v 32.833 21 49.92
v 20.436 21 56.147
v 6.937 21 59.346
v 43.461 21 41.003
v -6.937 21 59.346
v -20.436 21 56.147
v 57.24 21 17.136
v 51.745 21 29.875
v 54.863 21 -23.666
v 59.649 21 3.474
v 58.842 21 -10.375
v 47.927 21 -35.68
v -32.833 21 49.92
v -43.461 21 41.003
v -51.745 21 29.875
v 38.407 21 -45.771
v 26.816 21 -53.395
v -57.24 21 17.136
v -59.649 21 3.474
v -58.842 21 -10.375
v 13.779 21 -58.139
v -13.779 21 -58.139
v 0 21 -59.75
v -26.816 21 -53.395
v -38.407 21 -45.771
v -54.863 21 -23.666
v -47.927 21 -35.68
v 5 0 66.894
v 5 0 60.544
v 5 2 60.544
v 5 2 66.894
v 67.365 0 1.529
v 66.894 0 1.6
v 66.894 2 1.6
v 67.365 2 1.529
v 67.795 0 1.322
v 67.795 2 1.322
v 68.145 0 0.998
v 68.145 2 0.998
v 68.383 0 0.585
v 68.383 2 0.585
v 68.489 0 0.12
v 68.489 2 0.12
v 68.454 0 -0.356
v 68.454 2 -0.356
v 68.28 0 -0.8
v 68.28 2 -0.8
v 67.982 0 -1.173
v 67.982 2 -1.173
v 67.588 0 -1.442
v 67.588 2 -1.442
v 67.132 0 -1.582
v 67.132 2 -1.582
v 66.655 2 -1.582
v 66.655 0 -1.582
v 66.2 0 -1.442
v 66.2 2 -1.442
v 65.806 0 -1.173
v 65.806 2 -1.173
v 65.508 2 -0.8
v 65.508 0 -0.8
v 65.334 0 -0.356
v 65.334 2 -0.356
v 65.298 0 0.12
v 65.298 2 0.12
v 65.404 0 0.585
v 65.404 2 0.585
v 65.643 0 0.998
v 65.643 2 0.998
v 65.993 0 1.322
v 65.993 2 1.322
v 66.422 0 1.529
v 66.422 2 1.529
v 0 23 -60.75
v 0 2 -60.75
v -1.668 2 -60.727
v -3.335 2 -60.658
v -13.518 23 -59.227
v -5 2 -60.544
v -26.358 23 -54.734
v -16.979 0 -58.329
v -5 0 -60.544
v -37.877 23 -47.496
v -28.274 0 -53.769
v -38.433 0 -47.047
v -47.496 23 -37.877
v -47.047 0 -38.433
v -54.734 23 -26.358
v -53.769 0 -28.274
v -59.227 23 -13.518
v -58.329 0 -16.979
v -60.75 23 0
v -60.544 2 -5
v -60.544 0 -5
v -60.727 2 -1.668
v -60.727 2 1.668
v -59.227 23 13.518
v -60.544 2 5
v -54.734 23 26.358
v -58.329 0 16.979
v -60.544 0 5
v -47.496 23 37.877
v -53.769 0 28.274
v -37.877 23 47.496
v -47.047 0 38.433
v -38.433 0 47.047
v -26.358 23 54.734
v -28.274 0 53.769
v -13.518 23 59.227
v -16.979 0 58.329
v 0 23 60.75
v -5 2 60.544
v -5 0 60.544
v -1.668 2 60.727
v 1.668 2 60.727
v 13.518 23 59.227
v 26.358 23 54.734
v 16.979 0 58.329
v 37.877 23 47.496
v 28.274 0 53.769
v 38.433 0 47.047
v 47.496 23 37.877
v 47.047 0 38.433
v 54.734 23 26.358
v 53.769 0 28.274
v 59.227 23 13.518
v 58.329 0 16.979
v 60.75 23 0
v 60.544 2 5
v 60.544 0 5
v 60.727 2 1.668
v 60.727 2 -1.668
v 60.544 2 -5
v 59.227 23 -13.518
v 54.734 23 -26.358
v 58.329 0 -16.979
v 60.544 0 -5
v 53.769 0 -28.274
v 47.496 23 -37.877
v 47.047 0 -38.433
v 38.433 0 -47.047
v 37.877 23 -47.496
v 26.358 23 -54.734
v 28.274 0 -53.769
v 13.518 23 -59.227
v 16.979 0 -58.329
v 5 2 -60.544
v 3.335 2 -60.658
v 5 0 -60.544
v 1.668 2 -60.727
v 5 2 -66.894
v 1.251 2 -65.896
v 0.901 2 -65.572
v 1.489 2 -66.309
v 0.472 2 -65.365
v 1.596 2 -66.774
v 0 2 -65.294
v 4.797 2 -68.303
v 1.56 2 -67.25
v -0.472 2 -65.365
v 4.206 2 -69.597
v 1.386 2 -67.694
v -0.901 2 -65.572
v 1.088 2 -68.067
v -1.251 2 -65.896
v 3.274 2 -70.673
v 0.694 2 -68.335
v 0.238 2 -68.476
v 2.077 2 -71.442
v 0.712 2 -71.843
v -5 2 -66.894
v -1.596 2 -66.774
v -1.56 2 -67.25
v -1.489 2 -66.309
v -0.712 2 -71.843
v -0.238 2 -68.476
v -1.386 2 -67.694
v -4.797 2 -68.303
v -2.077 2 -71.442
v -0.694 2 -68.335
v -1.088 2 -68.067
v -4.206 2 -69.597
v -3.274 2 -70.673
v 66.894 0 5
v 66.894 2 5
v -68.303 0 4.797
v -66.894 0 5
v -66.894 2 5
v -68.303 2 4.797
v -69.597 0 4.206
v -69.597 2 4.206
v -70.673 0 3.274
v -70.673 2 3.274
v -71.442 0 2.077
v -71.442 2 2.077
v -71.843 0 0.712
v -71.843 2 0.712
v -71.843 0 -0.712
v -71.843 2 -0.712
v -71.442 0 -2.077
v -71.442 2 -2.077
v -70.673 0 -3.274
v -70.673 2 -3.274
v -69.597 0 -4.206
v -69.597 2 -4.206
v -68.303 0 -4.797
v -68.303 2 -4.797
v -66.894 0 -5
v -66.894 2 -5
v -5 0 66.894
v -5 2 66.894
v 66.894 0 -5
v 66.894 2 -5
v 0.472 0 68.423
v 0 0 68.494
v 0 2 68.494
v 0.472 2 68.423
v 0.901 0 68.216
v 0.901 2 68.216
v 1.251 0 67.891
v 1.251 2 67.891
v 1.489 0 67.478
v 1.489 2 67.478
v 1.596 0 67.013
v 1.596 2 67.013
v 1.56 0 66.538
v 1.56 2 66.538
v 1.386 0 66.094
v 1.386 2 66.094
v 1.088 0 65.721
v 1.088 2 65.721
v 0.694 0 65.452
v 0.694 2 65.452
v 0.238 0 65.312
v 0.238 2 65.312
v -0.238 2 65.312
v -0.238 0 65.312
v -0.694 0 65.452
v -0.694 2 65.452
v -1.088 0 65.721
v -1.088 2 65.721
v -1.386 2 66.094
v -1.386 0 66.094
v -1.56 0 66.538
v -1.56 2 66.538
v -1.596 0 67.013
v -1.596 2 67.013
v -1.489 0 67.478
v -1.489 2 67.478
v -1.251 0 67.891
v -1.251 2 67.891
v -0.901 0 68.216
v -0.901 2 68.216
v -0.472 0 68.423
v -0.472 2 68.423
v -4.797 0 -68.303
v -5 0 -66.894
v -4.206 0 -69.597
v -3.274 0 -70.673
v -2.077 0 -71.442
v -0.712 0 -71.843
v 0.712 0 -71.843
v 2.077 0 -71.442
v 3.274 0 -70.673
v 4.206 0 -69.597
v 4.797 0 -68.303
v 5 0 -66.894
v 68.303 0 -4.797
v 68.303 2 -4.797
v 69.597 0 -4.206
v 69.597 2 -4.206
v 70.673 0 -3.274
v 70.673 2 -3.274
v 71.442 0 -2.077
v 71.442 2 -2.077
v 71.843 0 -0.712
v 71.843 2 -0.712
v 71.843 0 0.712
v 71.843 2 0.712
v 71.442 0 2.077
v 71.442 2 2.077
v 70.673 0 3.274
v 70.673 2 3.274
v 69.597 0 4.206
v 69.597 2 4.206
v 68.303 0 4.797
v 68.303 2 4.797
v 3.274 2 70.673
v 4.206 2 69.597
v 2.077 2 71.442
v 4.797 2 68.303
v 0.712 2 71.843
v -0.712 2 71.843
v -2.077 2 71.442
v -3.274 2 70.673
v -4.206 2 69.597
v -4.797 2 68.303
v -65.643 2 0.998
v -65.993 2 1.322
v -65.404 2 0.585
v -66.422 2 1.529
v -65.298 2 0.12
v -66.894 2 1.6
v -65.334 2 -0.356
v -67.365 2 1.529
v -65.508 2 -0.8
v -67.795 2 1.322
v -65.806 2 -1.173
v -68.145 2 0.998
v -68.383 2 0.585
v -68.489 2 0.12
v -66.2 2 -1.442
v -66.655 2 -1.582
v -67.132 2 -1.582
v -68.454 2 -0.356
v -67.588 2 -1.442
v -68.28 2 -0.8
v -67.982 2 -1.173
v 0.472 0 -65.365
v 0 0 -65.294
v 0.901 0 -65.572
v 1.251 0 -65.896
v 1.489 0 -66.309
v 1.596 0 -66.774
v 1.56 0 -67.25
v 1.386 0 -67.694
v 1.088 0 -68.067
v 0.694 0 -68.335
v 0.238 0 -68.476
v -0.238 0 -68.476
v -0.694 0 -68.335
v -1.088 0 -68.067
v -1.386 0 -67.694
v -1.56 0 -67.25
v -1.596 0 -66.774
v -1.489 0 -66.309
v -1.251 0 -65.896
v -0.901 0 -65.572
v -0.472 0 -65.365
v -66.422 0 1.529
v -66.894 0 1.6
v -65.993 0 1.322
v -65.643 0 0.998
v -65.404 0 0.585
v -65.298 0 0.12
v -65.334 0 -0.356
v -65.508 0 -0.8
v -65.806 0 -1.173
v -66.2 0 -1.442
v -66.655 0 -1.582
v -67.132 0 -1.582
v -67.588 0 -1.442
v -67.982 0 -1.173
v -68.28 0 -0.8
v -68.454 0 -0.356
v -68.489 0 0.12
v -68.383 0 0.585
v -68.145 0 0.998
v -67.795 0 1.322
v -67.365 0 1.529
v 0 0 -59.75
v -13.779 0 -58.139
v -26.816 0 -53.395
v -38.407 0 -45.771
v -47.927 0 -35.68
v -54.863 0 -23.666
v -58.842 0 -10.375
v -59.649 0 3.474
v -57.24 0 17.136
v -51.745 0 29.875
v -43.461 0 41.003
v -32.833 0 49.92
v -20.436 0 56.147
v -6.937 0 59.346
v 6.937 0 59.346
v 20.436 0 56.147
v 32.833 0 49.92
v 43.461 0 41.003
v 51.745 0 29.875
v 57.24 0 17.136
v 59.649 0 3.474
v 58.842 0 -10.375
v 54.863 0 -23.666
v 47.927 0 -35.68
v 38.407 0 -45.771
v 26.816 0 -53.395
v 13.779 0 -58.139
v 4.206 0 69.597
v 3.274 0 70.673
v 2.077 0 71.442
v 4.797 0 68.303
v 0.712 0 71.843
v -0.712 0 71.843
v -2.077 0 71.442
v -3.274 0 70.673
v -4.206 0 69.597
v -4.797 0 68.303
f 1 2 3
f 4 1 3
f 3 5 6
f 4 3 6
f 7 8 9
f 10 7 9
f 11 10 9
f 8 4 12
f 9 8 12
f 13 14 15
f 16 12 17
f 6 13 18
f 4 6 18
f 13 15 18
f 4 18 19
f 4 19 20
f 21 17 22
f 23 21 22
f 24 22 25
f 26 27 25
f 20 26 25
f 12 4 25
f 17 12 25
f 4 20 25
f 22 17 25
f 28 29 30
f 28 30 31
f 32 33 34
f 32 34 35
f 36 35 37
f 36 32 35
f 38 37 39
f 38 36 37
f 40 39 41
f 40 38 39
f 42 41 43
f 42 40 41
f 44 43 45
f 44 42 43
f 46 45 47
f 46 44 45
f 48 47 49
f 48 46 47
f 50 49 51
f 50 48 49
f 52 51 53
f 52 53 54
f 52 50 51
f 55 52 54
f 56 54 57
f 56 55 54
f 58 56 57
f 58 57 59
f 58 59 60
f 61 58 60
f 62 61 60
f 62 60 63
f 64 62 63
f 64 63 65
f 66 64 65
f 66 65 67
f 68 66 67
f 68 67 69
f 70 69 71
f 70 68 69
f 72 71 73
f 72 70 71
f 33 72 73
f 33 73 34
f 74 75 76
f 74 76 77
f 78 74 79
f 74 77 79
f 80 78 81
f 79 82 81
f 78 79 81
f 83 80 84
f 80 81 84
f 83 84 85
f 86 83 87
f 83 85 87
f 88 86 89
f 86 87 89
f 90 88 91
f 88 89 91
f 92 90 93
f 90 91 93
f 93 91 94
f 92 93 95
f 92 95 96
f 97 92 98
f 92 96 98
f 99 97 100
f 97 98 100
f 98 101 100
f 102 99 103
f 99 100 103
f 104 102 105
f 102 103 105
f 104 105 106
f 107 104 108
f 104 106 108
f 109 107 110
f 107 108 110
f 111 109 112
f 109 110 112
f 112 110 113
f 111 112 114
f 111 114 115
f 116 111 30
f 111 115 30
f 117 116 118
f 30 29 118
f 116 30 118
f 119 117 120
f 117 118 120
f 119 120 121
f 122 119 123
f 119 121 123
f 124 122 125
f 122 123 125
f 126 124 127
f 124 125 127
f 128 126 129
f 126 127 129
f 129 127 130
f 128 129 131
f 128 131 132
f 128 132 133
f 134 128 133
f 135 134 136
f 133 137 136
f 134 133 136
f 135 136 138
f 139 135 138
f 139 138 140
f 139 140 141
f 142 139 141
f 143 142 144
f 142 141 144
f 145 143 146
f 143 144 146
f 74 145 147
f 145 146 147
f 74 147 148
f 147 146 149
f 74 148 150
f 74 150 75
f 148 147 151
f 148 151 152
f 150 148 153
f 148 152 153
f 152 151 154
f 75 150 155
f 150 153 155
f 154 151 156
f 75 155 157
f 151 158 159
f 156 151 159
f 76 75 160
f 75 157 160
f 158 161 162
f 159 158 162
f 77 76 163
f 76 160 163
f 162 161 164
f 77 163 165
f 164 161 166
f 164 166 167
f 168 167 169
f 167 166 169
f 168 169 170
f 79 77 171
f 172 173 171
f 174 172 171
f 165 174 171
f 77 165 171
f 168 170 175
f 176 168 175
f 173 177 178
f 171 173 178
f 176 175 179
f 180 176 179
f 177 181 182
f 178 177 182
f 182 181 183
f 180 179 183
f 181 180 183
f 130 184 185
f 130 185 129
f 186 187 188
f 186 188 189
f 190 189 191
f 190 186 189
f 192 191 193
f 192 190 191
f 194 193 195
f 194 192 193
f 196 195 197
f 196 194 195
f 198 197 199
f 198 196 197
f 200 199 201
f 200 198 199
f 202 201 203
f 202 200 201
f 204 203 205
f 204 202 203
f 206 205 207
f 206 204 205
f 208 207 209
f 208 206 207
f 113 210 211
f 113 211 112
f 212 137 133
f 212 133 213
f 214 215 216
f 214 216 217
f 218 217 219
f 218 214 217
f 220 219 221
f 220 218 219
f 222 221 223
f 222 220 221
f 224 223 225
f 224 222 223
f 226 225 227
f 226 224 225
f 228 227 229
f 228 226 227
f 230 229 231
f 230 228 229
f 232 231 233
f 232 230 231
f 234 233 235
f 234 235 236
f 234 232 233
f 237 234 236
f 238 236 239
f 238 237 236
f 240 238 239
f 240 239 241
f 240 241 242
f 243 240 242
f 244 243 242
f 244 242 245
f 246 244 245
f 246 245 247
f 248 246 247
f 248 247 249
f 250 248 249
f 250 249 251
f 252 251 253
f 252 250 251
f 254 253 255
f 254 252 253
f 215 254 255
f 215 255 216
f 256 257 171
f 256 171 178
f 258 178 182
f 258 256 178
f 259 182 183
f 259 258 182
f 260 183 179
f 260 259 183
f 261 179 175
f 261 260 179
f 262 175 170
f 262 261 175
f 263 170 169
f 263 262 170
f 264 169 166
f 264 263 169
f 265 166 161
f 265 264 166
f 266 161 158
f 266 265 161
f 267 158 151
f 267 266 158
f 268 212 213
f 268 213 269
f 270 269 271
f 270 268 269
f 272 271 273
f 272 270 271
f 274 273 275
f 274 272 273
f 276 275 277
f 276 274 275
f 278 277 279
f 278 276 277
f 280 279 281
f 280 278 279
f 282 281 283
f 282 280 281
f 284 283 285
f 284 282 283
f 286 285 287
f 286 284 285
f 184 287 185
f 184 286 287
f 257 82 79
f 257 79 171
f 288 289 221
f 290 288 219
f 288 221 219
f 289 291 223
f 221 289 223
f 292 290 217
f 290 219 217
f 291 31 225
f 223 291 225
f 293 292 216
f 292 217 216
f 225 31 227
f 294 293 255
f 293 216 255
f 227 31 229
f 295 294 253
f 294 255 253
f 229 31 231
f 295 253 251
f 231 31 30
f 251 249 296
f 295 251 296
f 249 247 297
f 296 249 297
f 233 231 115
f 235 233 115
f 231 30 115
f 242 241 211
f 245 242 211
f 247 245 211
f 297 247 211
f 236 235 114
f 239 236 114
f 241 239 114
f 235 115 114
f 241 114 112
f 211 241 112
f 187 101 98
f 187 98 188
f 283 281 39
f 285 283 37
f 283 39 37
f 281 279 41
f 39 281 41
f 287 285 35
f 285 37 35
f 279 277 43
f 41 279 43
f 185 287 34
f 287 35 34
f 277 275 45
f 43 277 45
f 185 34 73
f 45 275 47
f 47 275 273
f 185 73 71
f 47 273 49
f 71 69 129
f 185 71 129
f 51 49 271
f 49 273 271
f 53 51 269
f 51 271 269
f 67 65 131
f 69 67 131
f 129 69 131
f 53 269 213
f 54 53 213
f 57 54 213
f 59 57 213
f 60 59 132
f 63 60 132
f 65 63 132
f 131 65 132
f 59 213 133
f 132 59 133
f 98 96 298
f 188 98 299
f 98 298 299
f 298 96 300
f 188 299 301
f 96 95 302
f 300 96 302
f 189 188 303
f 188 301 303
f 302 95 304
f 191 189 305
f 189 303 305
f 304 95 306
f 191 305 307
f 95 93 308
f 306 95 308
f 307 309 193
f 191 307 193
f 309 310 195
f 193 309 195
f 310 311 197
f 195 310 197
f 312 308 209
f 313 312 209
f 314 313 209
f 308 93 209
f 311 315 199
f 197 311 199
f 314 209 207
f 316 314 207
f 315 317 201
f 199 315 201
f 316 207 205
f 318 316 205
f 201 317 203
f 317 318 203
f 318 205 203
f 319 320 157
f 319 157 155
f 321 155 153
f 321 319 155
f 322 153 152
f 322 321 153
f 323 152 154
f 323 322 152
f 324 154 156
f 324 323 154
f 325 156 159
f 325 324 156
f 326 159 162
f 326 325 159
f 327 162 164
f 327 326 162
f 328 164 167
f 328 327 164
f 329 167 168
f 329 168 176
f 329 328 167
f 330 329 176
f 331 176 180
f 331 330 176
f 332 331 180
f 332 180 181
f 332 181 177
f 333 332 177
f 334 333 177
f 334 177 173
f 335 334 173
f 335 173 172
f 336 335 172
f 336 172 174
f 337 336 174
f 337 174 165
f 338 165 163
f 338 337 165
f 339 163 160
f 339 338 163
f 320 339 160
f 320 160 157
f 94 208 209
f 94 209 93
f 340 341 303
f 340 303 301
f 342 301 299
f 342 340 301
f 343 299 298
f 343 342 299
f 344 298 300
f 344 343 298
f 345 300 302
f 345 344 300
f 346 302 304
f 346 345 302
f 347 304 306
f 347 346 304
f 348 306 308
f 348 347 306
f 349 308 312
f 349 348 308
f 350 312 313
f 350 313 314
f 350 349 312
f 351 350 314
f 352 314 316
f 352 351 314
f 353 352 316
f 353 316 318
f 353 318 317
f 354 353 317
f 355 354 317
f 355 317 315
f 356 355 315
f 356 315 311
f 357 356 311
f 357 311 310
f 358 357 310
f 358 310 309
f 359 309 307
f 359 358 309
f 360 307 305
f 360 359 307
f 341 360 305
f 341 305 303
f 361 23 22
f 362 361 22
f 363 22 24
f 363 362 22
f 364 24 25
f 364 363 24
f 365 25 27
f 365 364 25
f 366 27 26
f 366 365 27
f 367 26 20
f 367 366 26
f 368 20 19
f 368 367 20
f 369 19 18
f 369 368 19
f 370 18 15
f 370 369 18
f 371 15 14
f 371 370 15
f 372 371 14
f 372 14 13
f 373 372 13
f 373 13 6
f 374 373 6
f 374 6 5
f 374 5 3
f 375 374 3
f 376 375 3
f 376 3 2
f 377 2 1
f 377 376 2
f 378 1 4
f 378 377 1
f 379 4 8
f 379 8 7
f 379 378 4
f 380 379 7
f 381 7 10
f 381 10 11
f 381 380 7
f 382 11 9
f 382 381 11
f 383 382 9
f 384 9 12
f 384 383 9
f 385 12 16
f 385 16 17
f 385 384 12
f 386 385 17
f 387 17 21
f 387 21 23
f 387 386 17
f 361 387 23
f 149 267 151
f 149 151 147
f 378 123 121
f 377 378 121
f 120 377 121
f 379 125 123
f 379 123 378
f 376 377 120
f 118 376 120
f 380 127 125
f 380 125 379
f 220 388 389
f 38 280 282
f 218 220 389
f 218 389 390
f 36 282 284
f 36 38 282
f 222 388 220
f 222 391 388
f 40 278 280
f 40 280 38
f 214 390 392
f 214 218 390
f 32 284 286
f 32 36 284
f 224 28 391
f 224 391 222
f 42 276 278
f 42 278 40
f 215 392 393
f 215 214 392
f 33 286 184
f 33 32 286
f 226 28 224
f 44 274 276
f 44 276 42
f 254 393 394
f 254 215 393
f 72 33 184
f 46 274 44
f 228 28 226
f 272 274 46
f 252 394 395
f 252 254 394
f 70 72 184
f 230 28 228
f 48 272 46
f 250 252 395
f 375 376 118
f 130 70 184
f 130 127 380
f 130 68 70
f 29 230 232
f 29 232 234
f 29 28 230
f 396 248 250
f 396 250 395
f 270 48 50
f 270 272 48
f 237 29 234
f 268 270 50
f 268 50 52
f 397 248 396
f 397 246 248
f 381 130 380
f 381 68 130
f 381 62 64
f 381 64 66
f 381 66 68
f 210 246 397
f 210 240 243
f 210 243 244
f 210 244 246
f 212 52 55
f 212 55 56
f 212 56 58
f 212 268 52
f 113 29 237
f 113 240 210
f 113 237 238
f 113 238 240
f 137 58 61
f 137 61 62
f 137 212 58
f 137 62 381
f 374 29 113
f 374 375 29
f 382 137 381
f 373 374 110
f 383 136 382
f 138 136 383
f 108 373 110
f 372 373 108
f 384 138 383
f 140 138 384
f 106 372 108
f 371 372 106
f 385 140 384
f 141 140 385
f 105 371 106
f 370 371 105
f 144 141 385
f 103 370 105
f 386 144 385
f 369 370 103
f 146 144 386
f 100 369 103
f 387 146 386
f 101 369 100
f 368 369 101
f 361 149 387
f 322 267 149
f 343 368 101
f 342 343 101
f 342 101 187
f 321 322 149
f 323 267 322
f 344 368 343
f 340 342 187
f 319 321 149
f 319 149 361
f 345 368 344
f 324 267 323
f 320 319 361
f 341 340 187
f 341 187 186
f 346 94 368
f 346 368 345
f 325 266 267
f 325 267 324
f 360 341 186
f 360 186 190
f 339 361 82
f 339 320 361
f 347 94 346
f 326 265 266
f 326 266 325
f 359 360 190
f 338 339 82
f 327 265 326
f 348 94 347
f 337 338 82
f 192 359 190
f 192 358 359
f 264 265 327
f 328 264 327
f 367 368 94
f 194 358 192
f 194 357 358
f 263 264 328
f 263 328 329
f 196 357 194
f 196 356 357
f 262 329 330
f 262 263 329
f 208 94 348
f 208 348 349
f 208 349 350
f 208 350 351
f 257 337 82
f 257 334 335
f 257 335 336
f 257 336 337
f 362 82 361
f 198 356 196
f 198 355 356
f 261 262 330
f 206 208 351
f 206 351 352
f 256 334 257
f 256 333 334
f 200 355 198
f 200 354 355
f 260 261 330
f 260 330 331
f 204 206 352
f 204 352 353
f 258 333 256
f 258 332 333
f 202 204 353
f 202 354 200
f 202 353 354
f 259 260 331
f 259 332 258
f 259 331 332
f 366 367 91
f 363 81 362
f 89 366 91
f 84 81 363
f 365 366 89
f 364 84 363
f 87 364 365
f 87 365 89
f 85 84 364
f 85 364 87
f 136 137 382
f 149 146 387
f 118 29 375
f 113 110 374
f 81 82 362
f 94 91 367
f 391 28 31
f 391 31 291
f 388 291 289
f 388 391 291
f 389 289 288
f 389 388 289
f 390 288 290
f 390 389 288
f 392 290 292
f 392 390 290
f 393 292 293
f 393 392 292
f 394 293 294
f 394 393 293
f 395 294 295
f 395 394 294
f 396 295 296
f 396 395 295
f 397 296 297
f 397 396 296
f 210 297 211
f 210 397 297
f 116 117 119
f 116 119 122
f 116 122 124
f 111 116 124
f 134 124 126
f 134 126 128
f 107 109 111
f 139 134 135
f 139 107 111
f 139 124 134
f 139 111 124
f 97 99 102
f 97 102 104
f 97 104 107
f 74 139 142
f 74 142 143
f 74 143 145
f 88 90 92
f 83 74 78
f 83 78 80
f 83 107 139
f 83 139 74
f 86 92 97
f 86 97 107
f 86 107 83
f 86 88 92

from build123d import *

# Parameters (mm, degrees)
SKETCH1_R           = 60.75
SKETCH1_R_2         = 59.75
BOSS_EXTRUDE1_DEPTH = 21
SKETCH2_R           = 60.75
BOSS_EXTRUDE2_DEPTH = 2
SKETCH3_R           = 1.6
BOSS_EXTRUDE3_DEPTH = 2


with BuildPart() as part:
    # Sketch1 → Boss-Extrude1 (new body)
    with BuildSketch(Plane(origin=(0, 0, 0), x_dir=(1, 0, 0), z_dir=(0, 1, 0))):
        with Locations(Location((0, 0, 0), (0, 0, 90))):
            Circle(SKETCH1_R)
        with Locations(Location((0, 0, 0), (0, 0, 90))):
            Circle(SKETCH1_R_2, mode=Mode.SUBTRACT)
    extrude(amount=BOSS_EXTRUDE1_DEPTH)

    # Sketch2 → Boss-Extrude2 (add)
    with BuildSketch(Plane(origin=(0, 21, 0), x_dir=(1, 0, 0), z_dir=(0, 1, 0))):
        with Locations(Location((0, 0, 0), (0, 0, 90))):
            Circle(SKETCH2_R)
    extrude(amount=BOSS_EXTRUDE2_DEPTH)

    # Sketch3 → Boss-Extrude3 (add)
    # profile 1 of 4: a face of its own
    with BuildSketch(Plane(origin=(0, 0, 0), x_dir=(1, 0, 0), z_dir=(0, 1, 0))):
        with BuildLine():
            Line((5, 66.893889039), (5, 60.543889039))
            Line((5, 60.543889039), (-5, 60.543889039))
            Line((-5, 60.543889039), (-5, 66.893889039))
            ThreePointArc((-5, 66.893889039), (0, 71.893889039), (5, 66.893889039))
        make_face()
        with Locations(Location((0, 66.893889039, 0), (0, 0, 270))):
            Circle(SKETCH3_R, mode=Mode.SUBTRACT)
    # profile 2 of 4: a face of its own
    with BuildSketch(Plane(origin=(0, 0, 0), x_dir=(1, 0, 0), z_dir=(0, 1, 0))):
        with BuildLine():
            Line((60.543889039, 5), (66.893889039, 5))
            ThreePointArc((66.893889039, 5), (71.893889039, 0), (66.893889039, -5))
            Line((66.893889039, -5), (60.543889039, -5))
            Line((60.543889039, -5), (60.543889039, 5))
        make_face()
        with Locations(Location((66.893889039, 0, 0), (0, 0, 270))):
            Circle(SKETCH3_R, mode=Mode.SUBTRACT)
    # profile 3 of 4: a face of its own
    with BuildSketch(Plane(origin=(0, 0, 0), x_dir=(1, 0, 0), z_dir=(0, 1, 0))):
        with BuildLine():
            Line((5, -60.543889039), (5, -66.893889039))
            ThreePointArc((5, -66.893889039), (0, -71.893889039), (-5, -66.893889039))
            Line((-5, -66.893889039), (-5, -60.543889039))
            Line((-5, -60.543889039), (5, -60.543889039))
        make_face()
        with Locations(Location((0, -66.893889039, 0), (0, 0, 270))):
            Circle(SKETCH3_R, mode=Mode.SUBTRACT)
    # profile 4 of 4: a face of its own
    with BuildSketch(Plane(origin=(0, 0, 0), x_dir=(1, 0, 0), z_dir=(0, 1, 0))):
        with BuildLine():
            Line((-60.543889039, -5), (-66.893889039, -5))
            ThreePointArc((-66.893889039, -5), (-71.893889039, 0), (-66.893889039, 5))
            Line((-66.893889039, 5), (-60.543889039, 5))
            Line((-60.543889039, 5), (-60.543889039, -5))
        make_face()
        with Locations(Location((-66.893889039, 0, 0), (0, 0, 270))):
            Circle(SKETCH3_R, mode=Mode.SUBTRACT)
    extrude(amount=BOSS_EXTRUDE3_DEPTH)


solid = part.part
